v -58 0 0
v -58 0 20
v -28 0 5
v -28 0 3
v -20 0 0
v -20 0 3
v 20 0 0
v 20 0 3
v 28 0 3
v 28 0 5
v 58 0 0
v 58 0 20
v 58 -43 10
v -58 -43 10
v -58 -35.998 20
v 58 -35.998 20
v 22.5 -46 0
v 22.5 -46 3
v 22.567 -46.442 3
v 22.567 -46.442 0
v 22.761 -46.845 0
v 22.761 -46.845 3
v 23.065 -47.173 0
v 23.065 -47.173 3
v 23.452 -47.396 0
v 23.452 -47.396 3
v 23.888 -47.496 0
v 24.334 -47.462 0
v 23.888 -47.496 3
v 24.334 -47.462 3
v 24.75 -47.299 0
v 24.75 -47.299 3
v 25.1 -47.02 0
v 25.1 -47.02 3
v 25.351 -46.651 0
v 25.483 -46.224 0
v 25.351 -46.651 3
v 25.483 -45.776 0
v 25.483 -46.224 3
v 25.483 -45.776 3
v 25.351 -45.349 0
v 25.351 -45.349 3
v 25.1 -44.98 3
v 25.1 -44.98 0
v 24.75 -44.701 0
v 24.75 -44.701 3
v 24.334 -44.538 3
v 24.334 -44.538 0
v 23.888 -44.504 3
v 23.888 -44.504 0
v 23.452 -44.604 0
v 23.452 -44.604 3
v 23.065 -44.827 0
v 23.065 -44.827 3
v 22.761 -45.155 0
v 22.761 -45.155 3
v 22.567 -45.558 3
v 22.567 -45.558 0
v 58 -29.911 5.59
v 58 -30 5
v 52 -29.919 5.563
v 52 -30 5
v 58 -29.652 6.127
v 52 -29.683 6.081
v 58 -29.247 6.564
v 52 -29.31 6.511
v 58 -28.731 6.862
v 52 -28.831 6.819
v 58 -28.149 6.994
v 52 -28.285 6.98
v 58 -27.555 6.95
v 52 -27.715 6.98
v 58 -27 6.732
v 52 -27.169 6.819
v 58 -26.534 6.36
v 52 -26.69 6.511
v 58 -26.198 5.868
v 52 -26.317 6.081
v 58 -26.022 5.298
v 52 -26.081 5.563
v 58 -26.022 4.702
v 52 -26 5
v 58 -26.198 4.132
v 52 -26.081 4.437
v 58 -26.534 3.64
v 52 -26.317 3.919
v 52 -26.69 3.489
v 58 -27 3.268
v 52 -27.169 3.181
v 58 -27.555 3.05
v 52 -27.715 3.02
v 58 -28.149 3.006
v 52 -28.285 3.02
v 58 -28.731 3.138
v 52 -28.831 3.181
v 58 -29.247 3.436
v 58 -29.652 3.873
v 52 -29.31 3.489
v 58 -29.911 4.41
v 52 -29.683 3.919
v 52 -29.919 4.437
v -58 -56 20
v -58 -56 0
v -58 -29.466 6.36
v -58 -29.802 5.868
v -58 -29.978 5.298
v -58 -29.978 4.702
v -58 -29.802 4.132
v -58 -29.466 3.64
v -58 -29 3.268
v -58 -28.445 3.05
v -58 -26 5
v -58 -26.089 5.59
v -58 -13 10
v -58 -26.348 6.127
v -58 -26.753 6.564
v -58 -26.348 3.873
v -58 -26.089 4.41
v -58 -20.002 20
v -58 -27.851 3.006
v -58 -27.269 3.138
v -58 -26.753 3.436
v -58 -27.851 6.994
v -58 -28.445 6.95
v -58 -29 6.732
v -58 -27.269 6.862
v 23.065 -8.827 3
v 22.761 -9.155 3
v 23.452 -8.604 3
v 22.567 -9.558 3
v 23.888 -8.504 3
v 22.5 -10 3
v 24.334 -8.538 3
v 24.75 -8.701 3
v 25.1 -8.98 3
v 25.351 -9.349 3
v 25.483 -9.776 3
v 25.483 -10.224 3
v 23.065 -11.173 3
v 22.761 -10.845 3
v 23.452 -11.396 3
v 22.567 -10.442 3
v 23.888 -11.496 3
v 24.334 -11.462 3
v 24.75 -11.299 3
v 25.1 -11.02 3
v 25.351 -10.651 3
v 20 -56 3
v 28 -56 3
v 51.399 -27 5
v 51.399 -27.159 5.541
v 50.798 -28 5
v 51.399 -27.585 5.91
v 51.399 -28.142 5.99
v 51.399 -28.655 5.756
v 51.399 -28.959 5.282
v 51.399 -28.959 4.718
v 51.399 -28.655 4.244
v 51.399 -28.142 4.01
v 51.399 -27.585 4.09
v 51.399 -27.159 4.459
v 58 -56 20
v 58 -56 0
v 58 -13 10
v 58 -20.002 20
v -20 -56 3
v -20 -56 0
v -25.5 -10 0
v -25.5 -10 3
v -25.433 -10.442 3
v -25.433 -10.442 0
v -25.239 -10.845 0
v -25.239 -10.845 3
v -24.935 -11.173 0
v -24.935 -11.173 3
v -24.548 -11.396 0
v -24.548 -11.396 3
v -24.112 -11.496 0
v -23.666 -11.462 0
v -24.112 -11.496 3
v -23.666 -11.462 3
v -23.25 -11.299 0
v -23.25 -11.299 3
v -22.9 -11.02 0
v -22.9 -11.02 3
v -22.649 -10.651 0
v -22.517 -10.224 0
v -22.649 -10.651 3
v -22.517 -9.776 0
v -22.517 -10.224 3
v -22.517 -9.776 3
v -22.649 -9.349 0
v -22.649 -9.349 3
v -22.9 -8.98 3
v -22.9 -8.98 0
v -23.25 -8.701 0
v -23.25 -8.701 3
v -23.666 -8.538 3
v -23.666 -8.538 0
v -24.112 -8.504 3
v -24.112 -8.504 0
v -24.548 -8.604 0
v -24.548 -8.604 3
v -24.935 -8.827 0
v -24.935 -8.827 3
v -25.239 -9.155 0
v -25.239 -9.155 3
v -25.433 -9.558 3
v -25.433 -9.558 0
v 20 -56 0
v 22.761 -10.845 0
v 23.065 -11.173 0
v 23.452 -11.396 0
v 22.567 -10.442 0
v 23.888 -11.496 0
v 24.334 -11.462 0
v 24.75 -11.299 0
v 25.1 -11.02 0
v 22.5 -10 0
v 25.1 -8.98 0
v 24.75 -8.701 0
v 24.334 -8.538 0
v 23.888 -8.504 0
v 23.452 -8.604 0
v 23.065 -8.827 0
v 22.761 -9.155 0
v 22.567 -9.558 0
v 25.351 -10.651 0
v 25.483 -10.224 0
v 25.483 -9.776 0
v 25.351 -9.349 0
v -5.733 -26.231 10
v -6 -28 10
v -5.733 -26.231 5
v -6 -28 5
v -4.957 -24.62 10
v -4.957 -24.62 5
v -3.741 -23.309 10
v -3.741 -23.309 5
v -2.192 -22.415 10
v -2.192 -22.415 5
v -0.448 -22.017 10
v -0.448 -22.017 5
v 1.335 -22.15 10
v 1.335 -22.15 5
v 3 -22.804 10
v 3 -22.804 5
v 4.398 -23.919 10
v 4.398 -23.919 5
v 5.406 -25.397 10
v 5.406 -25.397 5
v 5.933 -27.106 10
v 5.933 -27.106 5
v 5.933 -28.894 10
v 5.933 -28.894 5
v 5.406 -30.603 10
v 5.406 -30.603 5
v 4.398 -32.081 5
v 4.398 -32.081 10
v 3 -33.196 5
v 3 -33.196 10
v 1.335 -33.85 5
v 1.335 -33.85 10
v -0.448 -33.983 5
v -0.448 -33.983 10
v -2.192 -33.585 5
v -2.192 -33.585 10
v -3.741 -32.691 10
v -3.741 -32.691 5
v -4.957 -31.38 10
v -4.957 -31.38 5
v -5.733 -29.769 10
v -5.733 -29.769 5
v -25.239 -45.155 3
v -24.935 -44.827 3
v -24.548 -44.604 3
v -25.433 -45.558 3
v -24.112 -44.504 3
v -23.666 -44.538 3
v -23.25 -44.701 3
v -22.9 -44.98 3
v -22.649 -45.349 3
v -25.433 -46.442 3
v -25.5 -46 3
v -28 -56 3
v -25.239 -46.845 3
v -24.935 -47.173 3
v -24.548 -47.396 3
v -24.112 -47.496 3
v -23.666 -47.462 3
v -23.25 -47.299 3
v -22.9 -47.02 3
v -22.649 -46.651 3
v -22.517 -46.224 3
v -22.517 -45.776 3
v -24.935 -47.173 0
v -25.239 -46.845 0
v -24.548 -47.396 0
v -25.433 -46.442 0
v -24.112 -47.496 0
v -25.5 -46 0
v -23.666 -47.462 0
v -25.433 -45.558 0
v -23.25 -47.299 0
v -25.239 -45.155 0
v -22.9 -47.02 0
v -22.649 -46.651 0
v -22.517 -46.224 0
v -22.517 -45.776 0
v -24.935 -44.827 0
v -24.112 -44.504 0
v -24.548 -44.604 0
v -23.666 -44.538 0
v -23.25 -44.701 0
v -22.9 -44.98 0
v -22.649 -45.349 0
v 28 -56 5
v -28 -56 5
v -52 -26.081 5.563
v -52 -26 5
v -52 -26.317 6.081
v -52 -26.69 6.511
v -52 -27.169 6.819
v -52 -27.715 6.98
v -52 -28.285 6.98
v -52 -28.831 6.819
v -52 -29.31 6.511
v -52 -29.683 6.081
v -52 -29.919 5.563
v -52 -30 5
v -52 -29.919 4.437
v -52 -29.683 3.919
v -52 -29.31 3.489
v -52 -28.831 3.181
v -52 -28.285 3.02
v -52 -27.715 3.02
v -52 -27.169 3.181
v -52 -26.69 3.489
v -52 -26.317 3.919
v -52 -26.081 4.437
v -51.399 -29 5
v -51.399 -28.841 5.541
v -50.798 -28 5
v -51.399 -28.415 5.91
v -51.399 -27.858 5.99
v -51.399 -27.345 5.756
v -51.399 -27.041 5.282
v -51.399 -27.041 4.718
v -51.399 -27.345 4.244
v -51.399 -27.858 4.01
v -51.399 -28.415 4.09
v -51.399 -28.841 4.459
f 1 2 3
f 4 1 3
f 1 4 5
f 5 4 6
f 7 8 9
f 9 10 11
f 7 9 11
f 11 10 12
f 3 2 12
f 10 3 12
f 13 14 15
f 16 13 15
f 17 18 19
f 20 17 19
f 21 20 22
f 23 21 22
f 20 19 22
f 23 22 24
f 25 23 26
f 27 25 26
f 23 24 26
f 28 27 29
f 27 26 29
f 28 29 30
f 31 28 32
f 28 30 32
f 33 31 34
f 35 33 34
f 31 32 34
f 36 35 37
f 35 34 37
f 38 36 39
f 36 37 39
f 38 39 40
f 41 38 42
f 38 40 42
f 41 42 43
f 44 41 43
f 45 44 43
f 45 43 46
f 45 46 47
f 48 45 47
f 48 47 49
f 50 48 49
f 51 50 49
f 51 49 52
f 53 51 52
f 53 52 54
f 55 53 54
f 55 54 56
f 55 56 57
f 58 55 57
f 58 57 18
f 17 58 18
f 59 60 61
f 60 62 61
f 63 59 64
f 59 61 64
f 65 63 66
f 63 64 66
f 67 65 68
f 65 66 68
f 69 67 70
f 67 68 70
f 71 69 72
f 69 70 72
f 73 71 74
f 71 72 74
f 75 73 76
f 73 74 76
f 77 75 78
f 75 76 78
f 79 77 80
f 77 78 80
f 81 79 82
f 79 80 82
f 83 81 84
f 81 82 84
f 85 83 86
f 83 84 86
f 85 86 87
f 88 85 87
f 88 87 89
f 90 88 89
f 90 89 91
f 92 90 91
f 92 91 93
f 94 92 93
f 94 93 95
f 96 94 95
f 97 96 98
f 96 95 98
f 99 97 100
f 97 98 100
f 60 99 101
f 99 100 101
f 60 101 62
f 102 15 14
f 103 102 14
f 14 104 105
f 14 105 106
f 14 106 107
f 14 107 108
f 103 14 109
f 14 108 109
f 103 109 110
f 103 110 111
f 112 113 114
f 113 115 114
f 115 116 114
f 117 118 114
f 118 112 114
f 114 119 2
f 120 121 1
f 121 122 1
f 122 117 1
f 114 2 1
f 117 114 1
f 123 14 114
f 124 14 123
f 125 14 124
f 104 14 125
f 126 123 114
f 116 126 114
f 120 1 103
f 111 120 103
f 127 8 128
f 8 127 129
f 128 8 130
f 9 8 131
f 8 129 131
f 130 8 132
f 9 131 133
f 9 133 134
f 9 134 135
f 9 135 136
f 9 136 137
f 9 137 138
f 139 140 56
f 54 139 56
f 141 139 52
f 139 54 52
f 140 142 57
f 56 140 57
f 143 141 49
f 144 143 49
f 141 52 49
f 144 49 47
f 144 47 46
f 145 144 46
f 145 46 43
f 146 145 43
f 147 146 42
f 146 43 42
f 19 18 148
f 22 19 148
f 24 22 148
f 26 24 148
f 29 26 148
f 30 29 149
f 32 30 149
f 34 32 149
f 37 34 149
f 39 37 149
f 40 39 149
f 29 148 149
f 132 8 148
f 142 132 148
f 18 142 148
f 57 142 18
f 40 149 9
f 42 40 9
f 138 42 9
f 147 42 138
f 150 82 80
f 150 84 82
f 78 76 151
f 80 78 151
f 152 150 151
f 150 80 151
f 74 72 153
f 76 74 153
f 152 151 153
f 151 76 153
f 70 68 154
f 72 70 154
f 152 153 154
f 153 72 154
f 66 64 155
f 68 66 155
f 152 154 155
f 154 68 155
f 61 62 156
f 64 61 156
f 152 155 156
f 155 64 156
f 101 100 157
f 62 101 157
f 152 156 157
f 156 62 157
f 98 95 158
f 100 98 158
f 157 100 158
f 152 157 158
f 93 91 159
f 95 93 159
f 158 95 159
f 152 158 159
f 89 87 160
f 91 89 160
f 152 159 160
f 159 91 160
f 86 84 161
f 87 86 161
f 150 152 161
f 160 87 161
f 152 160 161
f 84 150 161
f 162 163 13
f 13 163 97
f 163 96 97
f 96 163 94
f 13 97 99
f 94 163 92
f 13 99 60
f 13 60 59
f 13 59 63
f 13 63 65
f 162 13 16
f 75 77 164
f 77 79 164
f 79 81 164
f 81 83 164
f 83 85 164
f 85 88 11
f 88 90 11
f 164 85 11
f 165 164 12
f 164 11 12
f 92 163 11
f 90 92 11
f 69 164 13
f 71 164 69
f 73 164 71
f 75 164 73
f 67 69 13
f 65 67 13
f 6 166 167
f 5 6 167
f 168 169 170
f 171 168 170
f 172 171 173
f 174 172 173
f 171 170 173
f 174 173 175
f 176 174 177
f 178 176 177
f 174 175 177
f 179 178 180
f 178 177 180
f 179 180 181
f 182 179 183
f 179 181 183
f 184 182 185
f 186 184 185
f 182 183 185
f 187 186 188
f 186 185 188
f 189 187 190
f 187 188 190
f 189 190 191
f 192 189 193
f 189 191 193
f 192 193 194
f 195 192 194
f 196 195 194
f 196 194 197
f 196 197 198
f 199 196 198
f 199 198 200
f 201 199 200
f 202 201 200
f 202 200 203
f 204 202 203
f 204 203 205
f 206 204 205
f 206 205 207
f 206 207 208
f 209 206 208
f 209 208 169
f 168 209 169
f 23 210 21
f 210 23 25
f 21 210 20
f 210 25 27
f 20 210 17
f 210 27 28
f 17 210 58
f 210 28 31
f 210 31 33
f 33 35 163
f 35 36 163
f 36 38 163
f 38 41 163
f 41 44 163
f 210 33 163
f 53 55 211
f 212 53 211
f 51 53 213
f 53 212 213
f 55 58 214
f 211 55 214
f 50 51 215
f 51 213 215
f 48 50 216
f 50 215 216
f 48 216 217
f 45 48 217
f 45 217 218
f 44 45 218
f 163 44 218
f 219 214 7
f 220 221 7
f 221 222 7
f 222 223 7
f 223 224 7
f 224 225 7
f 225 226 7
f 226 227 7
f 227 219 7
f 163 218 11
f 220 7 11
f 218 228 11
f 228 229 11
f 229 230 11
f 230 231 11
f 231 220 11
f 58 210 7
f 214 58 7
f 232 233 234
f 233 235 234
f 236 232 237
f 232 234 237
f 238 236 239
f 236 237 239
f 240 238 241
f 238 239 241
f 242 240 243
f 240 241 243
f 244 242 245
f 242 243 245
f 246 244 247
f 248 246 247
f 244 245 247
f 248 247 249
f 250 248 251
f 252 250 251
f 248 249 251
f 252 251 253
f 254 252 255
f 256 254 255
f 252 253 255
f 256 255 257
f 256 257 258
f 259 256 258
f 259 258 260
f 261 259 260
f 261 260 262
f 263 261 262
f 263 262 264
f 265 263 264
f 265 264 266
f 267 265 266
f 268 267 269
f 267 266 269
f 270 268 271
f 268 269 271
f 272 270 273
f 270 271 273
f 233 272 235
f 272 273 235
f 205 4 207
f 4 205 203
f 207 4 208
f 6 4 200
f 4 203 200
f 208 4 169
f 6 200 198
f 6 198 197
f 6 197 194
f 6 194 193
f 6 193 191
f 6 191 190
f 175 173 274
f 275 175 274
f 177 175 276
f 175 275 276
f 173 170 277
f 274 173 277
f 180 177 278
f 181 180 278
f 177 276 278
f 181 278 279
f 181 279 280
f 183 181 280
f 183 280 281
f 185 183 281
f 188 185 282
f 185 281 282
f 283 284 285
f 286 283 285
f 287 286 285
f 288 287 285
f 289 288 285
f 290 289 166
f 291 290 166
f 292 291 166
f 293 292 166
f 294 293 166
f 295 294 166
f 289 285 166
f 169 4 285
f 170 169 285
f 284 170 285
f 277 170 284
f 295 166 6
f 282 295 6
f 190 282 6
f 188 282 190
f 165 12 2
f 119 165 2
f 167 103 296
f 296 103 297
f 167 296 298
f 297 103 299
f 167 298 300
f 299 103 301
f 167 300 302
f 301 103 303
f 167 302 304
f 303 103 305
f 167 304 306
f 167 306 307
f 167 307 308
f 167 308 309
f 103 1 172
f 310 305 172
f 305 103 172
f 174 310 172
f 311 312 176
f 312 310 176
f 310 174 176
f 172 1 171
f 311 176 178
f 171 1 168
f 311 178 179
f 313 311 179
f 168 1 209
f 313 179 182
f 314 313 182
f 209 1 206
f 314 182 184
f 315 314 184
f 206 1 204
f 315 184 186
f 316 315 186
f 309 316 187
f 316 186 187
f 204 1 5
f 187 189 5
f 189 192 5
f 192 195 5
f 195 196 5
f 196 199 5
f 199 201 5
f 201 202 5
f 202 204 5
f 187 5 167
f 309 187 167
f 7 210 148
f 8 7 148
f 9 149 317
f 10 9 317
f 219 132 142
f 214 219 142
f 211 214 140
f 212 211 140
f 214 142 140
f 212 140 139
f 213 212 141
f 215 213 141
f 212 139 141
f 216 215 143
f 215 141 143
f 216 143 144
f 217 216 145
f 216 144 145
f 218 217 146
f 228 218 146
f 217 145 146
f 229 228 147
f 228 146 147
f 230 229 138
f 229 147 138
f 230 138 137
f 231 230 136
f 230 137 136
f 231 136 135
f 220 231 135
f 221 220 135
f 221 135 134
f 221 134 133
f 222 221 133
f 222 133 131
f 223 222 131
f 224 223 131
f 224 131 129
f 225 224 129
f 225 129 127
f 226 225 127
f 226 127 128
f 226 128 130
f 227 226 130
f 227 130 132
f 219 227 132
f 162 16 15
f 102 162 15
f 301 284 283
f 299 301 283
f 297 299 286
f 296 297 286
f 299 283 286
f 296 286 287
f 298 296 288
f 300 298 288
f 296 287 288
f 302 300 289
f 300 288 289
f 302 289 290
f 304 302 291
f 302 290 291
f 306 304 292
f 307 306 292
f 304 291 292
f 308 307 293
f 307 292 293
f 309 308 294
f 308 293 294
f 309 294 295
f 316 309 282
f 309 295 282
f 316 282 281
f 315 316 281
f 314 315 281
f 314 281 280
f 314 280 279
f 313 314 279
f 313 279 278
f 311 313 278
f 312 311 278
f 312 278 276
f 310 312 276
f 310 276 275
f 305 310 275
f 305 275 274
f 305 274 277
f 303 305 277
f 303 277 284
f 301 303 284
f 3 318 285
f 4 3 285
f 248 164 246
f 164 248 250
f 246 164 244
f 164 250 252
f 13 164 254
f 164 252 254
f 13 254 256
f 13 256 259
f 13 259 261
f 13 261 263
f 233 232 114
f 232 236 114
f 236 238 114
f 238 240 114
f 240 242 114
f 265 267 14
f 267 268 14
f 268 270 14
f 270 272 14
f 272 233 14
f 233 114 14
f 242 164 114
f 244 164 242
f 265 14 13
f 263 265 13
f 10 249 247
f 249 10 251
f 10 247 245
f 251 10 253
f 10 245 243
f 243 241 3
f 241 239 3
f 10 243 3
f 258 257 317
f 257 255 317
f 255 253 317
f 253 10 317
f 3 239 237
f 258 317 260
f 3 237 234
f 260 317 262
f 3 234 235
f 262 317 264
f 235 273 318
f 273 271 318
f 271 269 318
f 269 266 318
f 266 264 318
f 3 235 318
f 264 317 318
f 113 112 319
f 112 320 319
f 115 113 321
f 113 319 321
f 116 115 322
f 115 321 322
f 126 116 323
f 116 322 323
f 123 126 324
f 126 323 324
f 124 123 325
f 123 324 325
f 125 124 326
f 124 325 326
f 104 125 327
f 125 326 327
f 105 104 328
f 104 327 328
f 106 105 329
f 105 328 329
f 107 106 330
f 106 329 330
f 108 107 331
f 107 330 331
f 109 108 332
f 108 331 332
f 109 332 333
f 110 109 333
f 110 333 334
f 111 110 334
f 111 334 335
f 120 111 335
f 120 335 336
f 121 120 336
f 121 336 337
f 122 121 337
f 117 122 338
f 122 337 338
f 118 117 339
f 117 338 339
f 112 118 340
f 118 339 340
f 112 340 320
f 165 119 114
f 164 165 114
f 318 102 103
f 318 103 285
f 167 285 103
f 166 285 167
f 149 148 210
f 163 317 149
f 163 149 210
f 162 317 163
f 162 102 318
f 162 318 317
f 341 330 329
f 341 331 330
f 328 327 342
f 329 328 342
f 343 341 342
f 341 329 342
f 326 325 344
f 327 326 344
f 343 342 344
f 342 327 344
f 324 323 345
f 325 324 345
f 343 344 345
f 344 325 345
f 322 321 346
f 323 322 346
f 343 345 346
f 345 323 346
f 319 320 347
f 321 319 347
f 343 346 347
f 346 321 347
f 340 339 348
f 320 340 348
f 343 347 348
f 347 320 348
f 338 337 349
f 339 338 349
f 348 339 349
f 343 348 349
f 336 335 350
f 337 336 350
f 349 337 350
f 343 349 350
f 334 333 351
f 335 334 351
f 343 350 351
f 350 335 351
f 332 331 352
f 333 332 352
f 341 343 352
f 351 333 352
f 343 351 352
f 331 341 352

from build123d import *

# Parameters (mm, degrees)
F1_DEPTH  = 56
F3_DEPTH  = 116
F5_D      = 12
F5_DEPTH  = 5
F5_TIP    = 3.6051637142
F7_D      = 4
F7_DEPTH  = 6
F7_TIP    = 1.2017212381
F9_D      = 4
F9_DEPTH  = 6
F9_TIP    = 1.2017212381
F11_DEPTH = 56.001
F13_D     = 3
F13_DEPTH = 4
F13_TIP   = 0.9012909285


# Not quite as in the source:
# - a feature names something its author has since deleted; it is built from what else it names


with BuildPart() as f1:
    # F0 (on Front) → F1 (new body)
    with BuildSketch(Plane.XZ):
        Polygon((1.5, 0), (2, 2), (12, 2), (12.5, 0), (58, 0), (58, 20), (-58, 20), (-58, 0), (-12.5, 0), (-12, 2), (-2, 2), (-1.5, 0), (0, 0), align=None)
    extrude(amount=F1_DEPTH)

    # F2 (on face) → F3 (cut, through all)
    with BuildSketch(Plane(origin=(-58, 0, 0), x_dir=(0, -1, 0), z_dir=(-1, 0, 0))):
        Polygon((28, 20), (20.0020753821, 20), (13, 10), (28, 10), align=None)
        Polygon((35.9979246179, 20), (28, 20), (28, 10), (43, 10), align=None)
    extrude(amount=-F3_DEPTH, mode=Mode.SUBTRACT)

    # F5
    with Locations(Plane.XY.offset(10)):
        with Locations((0, -28)):
            Hole(F5_D / 2, depth=F5_DEPTH)
            with Locations((0, 0, -(F5_DEPTH + F5_TIP / 2))):  # 118° drill point
                Cone(0, F5_D / 2, F5_TIP, mode=Mode.SUBTRACT)

    # F7
    with Locations(Plane(origin=(-58, 0, 0), x_dir=(0, -1, 0), z_dir=(-1, 0, 0))):
        with Locations((28, 5)):
            Hole(F7_D / 2, depth=F7_DEPTH)
            with Locations((0, 0, -(F7_DEPTH + F7_TIP / 2))):  # 118° drill point
                Cone(0, F7_D / 2, F7_TIP, mode=Mode.SUBTRACT)

    # F9
    with Locations(Plane.YZ.offset(58)):
        with Locations((-28, 5)):
            Hole(F9_D / 2, depth=F9_DEPTH)
            with Locations((0, 0, -(F9_DEPTH + F9_TIP / 2))):  # 118° drill point
                Cone(0, F9_D / 2, F9_TIP, mode=Mode.SUBTRACT)

    # F10 (on face) → F11 (cut, through all)
    with BuildSketch(Plane.XZ.offset(56)):
        Polygon((12.5, 0), (20, 0), (20, 3), (28, 3), (28, 5), (20, 5), (0, 5), (0, 0), (1.5, 0), (2, 2), (12, 2), align=None)
        Polygon((-1.5, 0), (0, 0), (0, 5), (-20, 5), (-28, 5), (-28, 3), (-20, 3), (-20, 0), (-12.5, 0), (-12, 2), (-2, 2), align=None)
    extrude(amount=-F11_DEPTH, mode=Mode.SUBTRACT)

    # F13
    with Locations(Plane(origin=(0, 0, 0), x_dir=(1, 0, 0), z_dir=(0, 0, -1))):
        with Locations((-24, 46), (24, 46), (24, 10), (-24, 10)):
            Hole(F13_D / 2, depth=F13_DEPTH)
            with Locations((0, 0, -(F13_DEPTH + F13_TIP / 2))):  # 118° drill point
                Cone(0, F13_D / 2, F13_TIP, mode=Mode.SUBTRACT)


solid = f1.part
